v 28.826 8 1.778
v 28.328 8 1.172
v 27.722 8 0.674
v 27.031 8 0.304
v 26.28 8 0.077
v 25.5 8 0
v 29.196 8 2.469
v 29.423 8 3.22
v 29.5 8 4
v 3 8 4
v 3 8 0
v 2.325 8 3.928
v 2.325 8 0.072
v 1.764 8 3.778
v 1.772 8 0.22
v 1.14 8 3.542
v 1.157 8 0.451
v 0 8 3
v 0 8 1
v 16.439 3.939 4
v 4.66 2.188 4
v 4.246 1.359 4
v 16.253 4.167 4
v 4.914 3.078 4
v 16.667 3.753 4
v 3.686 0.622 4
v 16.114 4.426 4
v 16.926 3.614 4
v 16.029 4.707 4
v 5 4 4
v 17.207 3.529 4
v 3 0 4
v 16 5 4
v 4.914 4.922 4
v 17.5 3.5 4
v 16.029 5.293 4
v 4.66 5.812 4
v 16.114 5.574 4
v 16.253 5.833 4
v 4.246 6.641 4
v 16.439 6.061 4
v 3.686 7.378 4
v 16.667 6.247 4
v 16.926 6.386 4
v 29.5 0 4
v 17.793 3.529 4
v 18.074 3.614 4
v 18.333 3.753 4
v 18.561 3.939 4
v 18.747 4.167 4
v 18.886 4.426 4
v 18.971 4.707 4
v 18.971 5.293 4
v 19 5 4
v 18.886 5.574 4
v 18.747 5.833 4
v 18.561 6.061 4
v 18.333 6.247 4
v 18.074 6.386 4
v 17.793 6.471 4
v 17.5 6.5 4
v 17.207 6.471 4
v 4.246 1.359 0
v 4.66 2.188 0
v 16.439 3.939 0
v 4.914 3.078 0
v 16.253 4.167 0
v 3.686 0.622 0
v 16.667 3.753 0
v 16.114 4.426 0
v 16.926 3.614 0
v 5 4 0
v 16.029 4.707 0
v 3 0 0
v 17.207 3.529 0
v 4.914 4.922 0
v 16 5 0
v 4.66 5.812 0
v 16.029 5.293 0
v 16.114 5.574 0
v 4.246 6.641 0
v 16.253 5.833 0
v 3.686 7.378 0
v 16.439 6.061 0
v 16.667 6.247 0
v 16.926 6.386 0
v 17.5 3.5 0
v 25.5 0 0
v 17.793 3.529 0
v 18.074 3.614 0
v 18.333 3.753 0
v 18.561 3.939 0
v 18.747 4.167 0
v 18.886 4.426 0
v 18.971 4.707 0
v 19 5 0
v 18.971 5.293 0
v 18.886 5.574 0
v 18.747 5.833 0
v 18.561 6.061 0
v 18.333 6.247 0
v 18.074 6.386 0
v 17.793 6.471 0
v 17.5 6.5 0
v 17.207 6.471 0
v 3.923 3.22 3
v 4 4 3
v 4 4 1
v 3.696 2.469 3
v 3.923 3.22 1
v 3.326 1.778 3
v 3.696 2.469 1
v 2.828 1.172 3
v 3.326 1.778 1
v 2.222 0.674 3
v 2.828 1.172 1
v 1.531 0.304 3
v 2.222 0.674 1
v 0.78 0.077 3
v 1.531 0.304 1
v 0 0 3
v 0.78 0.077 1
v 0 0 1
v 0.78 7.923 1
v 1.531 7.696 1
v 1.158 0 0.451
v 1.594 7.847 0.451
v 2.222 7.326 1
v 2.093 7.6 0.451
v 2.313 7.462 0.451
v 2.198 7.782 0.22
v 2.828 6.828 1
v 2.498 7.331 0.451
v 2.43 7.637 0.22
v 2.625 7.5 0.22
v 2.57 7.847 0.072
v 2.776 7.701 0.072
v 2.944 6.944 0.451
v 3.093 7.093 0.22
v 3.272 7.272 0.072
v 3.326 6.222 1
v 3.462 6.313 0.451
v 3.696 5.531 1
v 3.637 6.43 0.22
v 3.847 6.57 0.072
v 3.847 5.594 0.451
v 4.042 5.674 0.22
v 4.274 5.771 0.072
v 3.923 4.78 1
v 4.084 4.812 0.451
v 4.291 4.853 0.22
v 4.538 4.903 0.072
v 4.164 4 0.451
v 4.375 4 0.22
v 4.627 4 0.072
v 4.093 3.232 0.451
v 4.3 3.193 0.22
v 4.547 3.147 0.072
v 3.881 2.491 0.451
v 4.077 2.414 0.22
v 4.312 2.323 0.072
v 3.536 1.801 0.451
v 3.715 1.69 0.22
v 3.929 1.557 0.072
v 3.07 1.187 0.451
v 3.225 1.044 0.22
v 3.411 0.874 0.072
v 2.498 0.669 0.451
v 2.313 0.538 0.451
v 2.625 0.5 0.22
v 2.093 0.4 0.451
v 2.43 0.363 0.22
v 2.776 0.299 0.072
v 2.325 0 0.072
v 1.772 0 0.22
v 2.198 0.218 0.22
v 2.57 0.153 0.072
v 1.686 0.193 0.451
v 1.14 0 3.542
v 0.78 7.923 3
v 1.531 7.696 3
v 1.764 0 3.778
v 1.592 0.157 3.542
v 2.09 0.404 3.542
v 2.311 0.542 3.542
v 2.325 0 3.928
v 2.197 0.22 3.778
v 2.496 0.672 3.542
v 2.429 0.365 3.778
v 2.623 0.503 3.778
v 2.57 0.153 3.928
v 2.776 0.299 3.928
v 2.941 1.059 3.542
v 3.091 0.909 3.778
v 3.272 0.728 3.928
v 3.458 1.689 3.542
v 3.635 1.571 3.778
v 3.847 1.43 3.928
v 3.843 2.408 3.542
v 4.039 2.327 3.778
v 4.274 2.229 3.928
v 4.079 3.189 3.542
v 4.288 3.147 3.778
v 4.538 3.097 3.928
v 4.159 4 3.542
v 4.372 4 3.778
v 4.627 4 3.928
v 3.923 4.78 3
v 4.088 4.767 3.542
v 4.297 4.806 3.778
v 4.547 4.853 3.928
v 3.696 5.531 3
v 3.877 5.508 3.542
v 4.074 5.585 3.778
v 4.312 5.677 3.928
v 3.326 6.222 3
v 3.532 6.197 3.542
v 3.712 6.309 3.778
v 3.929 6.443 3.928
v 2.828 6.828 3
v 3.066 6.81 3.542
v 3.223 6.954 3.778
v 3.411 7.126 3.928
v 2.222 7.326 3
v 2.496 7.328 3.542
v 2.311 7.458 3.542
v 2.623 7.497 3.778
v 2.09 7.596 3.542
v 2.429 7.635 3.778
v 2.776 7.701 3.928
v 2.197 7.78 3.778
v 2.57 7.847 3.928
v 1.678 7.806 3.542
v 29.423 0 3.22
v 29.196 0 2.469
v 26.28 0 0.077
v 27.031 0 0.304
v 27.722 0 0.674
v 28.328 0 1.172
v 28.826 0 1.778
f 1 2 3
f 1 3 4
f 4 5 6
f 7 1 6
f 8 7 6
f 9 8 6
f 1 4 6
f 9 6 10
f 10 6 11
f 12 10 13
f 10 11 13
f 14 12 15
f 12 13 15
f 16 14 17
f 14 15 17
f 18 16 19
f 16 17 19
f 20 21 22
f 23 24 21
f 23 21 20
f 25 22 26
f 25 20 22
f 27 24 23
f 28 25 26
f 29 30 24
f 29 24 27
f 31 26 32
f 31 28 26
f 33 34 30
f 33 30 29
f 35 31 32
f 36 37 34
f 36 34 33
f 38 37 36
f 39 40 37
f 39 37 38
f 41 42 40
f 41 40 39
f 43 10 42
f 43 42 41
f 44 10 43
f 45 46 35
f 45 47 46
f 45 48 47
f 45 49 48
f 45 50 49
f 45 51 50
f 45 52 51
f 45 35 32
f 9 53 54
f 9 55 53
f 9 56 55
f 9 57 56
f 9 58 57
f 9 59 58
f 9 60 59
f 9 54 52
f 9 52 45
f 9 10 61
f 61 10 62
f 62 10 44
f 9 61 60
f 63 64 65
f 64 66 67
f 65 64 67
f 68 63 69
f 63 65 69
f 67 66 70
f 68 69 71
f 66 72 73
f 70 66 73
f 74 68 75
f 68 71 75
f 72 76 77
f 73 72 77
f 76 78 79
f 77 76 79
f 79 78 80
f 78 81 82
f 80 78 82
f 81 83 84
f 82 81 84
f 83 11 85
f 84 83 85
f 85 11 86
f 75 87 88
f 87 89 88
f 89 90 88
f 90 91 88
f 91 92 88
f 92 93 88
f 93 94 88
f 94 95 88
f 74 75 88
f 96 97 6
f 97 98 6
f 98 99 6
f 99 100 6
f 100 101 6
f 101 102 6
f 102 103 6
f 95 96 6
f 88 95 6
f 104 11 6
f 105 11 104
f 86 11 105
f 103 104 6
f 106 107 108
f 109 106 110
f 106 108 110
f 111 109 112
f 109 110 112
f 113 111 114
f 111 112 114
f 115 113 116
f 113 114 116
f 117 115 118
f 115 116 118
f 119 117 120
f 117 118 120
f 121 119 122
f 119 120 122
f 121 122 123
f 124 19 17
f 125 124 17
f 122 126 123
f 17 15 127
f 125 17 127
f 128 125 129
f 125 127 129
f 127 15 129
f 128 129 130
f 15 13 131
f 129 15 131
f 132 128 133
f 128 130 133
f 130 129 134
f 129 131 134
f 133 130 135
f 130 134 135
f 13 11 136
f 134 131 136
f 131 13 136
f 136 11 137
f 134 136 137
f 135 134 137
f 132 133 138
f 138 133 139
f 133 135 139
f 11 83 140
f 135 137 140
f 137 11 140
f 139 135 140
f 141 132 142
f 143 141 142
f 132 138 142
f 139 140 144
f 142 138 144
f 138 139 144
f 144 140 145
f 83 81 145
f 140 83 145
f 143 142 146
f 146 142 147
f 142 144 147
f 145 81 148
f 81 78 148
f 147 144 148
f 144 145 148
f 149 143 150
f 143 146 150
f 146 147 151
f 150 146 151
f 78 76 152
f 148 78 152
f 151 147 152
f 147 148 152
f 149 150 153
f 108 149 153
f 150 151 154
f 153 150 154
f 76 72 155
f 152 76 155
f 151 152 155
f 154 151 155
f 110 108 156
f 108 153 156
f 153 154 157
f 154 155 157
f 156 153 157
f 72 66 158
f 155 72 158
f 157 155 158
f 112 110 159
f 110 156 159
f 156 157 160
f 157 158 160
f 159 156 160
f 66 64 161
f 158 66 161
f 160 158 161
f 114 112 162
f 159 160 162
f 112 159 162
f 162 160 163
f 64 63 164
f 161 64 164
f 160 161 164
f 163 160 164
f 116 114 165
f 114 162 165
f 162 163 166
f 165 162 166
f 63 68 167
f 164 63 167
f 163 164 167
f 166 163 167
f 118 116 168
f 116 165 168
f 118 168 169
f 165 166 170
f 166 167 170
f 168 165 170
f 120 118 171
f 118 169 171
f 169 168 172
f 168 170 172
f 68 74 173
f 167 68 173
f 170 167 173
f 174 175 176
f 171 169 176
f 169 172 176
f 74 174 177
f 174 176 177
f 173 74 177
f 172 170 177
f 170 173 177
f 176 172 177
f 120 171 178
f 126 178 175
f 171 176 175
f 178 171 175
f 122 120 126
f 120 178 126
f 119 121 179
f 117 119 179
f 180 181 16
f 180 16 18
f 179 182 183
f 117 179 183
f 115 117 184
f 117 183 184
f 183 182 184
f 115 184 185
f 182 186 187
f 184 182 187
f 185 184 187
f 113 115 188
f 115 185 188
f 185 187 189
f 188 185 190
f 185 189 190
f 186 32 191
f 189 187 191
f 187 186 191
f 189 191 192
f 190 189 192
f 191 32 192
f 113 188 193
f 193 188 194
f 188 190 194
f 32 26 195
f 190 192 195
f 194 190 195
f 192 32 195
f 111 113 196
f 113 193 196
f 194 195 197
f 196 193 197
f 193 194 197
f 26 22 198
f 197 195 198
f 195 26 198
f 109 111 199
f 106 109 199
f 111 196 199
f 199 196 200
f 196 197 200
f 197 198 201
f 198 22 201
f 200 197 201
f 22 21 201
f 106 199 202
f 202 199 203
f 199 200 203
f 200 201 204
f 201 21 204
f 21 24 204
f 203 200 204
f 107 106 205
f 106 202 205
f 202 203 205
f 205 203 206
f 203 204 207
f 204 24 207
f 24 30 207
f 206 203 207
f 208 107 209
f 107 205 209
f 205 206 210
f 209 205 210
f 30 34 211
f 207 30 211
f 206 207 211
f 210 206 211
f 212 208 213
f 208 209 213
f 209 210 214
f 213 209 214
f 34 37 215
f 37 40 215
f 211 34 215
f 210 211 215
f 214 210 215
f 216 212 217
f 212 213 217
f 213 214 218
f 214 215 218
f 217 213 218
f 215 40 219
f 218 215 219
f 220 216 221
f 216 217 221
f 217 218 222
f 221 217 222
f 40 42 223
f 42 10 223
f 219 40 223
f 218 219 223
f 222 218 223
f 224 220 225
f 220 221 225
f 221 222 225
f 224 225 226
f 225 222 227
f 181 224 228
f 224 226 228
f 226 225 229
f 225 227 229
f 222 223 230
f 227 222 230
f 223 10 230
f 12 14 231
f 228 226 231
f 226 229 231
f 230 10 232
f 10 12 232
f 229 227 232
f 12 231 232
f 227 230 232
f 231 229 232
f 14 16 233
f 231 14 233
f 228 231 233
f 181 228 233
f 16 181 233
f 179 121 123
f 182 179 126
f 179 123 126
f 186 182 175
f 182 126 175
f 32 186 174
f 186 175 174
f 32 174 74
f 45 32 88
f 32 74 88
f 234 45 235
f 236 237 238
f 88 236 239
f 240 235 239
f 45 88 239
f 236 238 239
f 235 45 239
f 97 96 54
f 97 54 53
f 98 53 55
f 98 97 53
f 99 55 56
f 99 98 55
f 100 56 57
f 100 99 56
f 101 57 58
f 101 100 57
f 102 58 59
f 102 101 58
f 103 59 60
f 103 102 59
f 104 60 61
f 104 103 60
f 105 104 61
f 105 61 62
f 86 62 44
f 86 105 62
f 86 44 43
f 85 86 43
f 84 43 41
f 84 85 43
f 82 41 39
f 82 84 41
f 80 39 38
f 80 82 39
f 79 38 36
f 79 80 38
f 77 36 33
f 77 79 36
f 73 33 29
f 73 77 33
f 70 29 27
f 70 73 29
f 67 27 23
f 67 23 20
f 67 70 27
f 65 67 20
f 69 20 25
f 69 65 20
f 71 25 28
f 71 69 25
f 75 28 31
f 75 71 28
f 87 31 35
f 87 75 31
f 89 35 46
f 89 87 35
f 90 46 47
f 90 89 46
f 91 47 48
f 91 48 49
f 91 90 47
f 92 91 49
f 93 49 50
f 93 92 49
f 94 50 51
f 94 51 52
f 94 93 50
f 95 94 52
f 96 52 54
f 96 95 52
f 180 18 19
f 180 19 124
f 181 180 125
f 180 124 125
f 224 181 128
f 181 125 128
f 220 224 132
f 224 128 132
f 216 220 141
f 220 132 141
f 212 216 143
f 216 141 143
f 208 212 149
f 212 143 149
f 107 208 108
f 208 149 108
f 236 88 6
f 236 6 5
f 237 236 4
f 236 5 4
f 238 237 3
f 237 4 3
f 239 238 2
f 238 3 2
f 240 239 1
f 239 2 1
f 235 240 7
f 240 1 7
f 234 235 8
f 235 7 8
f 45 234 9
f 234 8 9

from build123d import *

# Parameters (mm, degrees)
F0_R        = 1.5
F1_DEPTH    = 4
F2_T2_ANGLE = 301.9493341655
F2_T4_ANGLE = 301.9493341655
F3_R        = 3.99999


# Not quite as in the source:
# - a fillet or chamfer that OpenCascade refuses, or shapes differently, is made with other operations: its cross-section is extruded or revolved along the edge and cut away or added
# - a fillet or chamfer is up to 0.001 mm smaller than in the source, because OpenCascade refuses the exact size


with BuildPart() as f1:
    # F0 (on Top) → F1 (new body)
    with BuildSketch(Plane.XY):
        with BuildLine():
            ThreePointArc((0, 8), (2.8284271247, 6.8284271247), (4, 4))
            ThreePointArc((4, 4), (2.8284271247, 1.1715728753), (0, 0))
            Line((0, 0), (29.5, 0))
            Line((29.5, 0), (29.5, 8))
            Line((29.5, 8), (0, 8))
        make_face()
        with Locations((17.5, 5)):
            Circle(F0_R, mode=Mode.SUBTRACT)
    extrude(amount=F1_DEPTH)

    # F2: fillet of radius 1 on 2 edges, made by hand

    # F2_s1 → F2_t2 (revolve, cut)
    with BuildSketch(Plane(origin=(1.697032729, 3.0583382808, 0), x_dir=(0, 0, 1), z_dir=(-0.4851962797, -0.8744052666, 0))):
        with BuildLine():
            ThreePointArc((1, 5.9407851187), (0.2928932188, 6.2336783375), (0, 6.9407851187))
            Line((0, 6.9407851187), (0, 5.9407851187))
            Line((0, 5.9407851187), (1, 5.9407851187))
        make_face()
    revolve(axis=Axis((0, 4, 0), (0, 0, -1)), revolution_arc=F2_T2_ANGLE, mode=Mode.SUBTRACT)

    # F2_s3 → F2_t4 (revolve, cut)
    with BuildSketch(Plane(origin=(-1.697032729, 3.0583382808, 0), x_dir=(0, 0, 1), z_dir=(-0.4851962797, 0.8744052666, 0))):
        with BuildLine():
            ThreePointArc((3, -2.0592148813), (3.7071067812, -2.3521081002), (4, -3.0592148813))
            Line((4, -3.0592148813), (4, -2.0592148813))
            Line((4, -2.0592148813), (3, -2.0592148813))
        make_face()
    revolve(axis=Axis((0, 4, 4), (0, 0, 1)), revolution_arc=F2_T4_ANGLE, mode=Mode.SUBTRACT)

    # F3 (radius 4 in the source; OpenCascade refuses exactly that, so slightly less here)
    f3_edges = [f1.edges().sort_by_distance(p)[0] for p in [
        (29.5, 4, 0),
    ]]
    fillet(f3_edges, radius=F3_R)


solid = f1.part
